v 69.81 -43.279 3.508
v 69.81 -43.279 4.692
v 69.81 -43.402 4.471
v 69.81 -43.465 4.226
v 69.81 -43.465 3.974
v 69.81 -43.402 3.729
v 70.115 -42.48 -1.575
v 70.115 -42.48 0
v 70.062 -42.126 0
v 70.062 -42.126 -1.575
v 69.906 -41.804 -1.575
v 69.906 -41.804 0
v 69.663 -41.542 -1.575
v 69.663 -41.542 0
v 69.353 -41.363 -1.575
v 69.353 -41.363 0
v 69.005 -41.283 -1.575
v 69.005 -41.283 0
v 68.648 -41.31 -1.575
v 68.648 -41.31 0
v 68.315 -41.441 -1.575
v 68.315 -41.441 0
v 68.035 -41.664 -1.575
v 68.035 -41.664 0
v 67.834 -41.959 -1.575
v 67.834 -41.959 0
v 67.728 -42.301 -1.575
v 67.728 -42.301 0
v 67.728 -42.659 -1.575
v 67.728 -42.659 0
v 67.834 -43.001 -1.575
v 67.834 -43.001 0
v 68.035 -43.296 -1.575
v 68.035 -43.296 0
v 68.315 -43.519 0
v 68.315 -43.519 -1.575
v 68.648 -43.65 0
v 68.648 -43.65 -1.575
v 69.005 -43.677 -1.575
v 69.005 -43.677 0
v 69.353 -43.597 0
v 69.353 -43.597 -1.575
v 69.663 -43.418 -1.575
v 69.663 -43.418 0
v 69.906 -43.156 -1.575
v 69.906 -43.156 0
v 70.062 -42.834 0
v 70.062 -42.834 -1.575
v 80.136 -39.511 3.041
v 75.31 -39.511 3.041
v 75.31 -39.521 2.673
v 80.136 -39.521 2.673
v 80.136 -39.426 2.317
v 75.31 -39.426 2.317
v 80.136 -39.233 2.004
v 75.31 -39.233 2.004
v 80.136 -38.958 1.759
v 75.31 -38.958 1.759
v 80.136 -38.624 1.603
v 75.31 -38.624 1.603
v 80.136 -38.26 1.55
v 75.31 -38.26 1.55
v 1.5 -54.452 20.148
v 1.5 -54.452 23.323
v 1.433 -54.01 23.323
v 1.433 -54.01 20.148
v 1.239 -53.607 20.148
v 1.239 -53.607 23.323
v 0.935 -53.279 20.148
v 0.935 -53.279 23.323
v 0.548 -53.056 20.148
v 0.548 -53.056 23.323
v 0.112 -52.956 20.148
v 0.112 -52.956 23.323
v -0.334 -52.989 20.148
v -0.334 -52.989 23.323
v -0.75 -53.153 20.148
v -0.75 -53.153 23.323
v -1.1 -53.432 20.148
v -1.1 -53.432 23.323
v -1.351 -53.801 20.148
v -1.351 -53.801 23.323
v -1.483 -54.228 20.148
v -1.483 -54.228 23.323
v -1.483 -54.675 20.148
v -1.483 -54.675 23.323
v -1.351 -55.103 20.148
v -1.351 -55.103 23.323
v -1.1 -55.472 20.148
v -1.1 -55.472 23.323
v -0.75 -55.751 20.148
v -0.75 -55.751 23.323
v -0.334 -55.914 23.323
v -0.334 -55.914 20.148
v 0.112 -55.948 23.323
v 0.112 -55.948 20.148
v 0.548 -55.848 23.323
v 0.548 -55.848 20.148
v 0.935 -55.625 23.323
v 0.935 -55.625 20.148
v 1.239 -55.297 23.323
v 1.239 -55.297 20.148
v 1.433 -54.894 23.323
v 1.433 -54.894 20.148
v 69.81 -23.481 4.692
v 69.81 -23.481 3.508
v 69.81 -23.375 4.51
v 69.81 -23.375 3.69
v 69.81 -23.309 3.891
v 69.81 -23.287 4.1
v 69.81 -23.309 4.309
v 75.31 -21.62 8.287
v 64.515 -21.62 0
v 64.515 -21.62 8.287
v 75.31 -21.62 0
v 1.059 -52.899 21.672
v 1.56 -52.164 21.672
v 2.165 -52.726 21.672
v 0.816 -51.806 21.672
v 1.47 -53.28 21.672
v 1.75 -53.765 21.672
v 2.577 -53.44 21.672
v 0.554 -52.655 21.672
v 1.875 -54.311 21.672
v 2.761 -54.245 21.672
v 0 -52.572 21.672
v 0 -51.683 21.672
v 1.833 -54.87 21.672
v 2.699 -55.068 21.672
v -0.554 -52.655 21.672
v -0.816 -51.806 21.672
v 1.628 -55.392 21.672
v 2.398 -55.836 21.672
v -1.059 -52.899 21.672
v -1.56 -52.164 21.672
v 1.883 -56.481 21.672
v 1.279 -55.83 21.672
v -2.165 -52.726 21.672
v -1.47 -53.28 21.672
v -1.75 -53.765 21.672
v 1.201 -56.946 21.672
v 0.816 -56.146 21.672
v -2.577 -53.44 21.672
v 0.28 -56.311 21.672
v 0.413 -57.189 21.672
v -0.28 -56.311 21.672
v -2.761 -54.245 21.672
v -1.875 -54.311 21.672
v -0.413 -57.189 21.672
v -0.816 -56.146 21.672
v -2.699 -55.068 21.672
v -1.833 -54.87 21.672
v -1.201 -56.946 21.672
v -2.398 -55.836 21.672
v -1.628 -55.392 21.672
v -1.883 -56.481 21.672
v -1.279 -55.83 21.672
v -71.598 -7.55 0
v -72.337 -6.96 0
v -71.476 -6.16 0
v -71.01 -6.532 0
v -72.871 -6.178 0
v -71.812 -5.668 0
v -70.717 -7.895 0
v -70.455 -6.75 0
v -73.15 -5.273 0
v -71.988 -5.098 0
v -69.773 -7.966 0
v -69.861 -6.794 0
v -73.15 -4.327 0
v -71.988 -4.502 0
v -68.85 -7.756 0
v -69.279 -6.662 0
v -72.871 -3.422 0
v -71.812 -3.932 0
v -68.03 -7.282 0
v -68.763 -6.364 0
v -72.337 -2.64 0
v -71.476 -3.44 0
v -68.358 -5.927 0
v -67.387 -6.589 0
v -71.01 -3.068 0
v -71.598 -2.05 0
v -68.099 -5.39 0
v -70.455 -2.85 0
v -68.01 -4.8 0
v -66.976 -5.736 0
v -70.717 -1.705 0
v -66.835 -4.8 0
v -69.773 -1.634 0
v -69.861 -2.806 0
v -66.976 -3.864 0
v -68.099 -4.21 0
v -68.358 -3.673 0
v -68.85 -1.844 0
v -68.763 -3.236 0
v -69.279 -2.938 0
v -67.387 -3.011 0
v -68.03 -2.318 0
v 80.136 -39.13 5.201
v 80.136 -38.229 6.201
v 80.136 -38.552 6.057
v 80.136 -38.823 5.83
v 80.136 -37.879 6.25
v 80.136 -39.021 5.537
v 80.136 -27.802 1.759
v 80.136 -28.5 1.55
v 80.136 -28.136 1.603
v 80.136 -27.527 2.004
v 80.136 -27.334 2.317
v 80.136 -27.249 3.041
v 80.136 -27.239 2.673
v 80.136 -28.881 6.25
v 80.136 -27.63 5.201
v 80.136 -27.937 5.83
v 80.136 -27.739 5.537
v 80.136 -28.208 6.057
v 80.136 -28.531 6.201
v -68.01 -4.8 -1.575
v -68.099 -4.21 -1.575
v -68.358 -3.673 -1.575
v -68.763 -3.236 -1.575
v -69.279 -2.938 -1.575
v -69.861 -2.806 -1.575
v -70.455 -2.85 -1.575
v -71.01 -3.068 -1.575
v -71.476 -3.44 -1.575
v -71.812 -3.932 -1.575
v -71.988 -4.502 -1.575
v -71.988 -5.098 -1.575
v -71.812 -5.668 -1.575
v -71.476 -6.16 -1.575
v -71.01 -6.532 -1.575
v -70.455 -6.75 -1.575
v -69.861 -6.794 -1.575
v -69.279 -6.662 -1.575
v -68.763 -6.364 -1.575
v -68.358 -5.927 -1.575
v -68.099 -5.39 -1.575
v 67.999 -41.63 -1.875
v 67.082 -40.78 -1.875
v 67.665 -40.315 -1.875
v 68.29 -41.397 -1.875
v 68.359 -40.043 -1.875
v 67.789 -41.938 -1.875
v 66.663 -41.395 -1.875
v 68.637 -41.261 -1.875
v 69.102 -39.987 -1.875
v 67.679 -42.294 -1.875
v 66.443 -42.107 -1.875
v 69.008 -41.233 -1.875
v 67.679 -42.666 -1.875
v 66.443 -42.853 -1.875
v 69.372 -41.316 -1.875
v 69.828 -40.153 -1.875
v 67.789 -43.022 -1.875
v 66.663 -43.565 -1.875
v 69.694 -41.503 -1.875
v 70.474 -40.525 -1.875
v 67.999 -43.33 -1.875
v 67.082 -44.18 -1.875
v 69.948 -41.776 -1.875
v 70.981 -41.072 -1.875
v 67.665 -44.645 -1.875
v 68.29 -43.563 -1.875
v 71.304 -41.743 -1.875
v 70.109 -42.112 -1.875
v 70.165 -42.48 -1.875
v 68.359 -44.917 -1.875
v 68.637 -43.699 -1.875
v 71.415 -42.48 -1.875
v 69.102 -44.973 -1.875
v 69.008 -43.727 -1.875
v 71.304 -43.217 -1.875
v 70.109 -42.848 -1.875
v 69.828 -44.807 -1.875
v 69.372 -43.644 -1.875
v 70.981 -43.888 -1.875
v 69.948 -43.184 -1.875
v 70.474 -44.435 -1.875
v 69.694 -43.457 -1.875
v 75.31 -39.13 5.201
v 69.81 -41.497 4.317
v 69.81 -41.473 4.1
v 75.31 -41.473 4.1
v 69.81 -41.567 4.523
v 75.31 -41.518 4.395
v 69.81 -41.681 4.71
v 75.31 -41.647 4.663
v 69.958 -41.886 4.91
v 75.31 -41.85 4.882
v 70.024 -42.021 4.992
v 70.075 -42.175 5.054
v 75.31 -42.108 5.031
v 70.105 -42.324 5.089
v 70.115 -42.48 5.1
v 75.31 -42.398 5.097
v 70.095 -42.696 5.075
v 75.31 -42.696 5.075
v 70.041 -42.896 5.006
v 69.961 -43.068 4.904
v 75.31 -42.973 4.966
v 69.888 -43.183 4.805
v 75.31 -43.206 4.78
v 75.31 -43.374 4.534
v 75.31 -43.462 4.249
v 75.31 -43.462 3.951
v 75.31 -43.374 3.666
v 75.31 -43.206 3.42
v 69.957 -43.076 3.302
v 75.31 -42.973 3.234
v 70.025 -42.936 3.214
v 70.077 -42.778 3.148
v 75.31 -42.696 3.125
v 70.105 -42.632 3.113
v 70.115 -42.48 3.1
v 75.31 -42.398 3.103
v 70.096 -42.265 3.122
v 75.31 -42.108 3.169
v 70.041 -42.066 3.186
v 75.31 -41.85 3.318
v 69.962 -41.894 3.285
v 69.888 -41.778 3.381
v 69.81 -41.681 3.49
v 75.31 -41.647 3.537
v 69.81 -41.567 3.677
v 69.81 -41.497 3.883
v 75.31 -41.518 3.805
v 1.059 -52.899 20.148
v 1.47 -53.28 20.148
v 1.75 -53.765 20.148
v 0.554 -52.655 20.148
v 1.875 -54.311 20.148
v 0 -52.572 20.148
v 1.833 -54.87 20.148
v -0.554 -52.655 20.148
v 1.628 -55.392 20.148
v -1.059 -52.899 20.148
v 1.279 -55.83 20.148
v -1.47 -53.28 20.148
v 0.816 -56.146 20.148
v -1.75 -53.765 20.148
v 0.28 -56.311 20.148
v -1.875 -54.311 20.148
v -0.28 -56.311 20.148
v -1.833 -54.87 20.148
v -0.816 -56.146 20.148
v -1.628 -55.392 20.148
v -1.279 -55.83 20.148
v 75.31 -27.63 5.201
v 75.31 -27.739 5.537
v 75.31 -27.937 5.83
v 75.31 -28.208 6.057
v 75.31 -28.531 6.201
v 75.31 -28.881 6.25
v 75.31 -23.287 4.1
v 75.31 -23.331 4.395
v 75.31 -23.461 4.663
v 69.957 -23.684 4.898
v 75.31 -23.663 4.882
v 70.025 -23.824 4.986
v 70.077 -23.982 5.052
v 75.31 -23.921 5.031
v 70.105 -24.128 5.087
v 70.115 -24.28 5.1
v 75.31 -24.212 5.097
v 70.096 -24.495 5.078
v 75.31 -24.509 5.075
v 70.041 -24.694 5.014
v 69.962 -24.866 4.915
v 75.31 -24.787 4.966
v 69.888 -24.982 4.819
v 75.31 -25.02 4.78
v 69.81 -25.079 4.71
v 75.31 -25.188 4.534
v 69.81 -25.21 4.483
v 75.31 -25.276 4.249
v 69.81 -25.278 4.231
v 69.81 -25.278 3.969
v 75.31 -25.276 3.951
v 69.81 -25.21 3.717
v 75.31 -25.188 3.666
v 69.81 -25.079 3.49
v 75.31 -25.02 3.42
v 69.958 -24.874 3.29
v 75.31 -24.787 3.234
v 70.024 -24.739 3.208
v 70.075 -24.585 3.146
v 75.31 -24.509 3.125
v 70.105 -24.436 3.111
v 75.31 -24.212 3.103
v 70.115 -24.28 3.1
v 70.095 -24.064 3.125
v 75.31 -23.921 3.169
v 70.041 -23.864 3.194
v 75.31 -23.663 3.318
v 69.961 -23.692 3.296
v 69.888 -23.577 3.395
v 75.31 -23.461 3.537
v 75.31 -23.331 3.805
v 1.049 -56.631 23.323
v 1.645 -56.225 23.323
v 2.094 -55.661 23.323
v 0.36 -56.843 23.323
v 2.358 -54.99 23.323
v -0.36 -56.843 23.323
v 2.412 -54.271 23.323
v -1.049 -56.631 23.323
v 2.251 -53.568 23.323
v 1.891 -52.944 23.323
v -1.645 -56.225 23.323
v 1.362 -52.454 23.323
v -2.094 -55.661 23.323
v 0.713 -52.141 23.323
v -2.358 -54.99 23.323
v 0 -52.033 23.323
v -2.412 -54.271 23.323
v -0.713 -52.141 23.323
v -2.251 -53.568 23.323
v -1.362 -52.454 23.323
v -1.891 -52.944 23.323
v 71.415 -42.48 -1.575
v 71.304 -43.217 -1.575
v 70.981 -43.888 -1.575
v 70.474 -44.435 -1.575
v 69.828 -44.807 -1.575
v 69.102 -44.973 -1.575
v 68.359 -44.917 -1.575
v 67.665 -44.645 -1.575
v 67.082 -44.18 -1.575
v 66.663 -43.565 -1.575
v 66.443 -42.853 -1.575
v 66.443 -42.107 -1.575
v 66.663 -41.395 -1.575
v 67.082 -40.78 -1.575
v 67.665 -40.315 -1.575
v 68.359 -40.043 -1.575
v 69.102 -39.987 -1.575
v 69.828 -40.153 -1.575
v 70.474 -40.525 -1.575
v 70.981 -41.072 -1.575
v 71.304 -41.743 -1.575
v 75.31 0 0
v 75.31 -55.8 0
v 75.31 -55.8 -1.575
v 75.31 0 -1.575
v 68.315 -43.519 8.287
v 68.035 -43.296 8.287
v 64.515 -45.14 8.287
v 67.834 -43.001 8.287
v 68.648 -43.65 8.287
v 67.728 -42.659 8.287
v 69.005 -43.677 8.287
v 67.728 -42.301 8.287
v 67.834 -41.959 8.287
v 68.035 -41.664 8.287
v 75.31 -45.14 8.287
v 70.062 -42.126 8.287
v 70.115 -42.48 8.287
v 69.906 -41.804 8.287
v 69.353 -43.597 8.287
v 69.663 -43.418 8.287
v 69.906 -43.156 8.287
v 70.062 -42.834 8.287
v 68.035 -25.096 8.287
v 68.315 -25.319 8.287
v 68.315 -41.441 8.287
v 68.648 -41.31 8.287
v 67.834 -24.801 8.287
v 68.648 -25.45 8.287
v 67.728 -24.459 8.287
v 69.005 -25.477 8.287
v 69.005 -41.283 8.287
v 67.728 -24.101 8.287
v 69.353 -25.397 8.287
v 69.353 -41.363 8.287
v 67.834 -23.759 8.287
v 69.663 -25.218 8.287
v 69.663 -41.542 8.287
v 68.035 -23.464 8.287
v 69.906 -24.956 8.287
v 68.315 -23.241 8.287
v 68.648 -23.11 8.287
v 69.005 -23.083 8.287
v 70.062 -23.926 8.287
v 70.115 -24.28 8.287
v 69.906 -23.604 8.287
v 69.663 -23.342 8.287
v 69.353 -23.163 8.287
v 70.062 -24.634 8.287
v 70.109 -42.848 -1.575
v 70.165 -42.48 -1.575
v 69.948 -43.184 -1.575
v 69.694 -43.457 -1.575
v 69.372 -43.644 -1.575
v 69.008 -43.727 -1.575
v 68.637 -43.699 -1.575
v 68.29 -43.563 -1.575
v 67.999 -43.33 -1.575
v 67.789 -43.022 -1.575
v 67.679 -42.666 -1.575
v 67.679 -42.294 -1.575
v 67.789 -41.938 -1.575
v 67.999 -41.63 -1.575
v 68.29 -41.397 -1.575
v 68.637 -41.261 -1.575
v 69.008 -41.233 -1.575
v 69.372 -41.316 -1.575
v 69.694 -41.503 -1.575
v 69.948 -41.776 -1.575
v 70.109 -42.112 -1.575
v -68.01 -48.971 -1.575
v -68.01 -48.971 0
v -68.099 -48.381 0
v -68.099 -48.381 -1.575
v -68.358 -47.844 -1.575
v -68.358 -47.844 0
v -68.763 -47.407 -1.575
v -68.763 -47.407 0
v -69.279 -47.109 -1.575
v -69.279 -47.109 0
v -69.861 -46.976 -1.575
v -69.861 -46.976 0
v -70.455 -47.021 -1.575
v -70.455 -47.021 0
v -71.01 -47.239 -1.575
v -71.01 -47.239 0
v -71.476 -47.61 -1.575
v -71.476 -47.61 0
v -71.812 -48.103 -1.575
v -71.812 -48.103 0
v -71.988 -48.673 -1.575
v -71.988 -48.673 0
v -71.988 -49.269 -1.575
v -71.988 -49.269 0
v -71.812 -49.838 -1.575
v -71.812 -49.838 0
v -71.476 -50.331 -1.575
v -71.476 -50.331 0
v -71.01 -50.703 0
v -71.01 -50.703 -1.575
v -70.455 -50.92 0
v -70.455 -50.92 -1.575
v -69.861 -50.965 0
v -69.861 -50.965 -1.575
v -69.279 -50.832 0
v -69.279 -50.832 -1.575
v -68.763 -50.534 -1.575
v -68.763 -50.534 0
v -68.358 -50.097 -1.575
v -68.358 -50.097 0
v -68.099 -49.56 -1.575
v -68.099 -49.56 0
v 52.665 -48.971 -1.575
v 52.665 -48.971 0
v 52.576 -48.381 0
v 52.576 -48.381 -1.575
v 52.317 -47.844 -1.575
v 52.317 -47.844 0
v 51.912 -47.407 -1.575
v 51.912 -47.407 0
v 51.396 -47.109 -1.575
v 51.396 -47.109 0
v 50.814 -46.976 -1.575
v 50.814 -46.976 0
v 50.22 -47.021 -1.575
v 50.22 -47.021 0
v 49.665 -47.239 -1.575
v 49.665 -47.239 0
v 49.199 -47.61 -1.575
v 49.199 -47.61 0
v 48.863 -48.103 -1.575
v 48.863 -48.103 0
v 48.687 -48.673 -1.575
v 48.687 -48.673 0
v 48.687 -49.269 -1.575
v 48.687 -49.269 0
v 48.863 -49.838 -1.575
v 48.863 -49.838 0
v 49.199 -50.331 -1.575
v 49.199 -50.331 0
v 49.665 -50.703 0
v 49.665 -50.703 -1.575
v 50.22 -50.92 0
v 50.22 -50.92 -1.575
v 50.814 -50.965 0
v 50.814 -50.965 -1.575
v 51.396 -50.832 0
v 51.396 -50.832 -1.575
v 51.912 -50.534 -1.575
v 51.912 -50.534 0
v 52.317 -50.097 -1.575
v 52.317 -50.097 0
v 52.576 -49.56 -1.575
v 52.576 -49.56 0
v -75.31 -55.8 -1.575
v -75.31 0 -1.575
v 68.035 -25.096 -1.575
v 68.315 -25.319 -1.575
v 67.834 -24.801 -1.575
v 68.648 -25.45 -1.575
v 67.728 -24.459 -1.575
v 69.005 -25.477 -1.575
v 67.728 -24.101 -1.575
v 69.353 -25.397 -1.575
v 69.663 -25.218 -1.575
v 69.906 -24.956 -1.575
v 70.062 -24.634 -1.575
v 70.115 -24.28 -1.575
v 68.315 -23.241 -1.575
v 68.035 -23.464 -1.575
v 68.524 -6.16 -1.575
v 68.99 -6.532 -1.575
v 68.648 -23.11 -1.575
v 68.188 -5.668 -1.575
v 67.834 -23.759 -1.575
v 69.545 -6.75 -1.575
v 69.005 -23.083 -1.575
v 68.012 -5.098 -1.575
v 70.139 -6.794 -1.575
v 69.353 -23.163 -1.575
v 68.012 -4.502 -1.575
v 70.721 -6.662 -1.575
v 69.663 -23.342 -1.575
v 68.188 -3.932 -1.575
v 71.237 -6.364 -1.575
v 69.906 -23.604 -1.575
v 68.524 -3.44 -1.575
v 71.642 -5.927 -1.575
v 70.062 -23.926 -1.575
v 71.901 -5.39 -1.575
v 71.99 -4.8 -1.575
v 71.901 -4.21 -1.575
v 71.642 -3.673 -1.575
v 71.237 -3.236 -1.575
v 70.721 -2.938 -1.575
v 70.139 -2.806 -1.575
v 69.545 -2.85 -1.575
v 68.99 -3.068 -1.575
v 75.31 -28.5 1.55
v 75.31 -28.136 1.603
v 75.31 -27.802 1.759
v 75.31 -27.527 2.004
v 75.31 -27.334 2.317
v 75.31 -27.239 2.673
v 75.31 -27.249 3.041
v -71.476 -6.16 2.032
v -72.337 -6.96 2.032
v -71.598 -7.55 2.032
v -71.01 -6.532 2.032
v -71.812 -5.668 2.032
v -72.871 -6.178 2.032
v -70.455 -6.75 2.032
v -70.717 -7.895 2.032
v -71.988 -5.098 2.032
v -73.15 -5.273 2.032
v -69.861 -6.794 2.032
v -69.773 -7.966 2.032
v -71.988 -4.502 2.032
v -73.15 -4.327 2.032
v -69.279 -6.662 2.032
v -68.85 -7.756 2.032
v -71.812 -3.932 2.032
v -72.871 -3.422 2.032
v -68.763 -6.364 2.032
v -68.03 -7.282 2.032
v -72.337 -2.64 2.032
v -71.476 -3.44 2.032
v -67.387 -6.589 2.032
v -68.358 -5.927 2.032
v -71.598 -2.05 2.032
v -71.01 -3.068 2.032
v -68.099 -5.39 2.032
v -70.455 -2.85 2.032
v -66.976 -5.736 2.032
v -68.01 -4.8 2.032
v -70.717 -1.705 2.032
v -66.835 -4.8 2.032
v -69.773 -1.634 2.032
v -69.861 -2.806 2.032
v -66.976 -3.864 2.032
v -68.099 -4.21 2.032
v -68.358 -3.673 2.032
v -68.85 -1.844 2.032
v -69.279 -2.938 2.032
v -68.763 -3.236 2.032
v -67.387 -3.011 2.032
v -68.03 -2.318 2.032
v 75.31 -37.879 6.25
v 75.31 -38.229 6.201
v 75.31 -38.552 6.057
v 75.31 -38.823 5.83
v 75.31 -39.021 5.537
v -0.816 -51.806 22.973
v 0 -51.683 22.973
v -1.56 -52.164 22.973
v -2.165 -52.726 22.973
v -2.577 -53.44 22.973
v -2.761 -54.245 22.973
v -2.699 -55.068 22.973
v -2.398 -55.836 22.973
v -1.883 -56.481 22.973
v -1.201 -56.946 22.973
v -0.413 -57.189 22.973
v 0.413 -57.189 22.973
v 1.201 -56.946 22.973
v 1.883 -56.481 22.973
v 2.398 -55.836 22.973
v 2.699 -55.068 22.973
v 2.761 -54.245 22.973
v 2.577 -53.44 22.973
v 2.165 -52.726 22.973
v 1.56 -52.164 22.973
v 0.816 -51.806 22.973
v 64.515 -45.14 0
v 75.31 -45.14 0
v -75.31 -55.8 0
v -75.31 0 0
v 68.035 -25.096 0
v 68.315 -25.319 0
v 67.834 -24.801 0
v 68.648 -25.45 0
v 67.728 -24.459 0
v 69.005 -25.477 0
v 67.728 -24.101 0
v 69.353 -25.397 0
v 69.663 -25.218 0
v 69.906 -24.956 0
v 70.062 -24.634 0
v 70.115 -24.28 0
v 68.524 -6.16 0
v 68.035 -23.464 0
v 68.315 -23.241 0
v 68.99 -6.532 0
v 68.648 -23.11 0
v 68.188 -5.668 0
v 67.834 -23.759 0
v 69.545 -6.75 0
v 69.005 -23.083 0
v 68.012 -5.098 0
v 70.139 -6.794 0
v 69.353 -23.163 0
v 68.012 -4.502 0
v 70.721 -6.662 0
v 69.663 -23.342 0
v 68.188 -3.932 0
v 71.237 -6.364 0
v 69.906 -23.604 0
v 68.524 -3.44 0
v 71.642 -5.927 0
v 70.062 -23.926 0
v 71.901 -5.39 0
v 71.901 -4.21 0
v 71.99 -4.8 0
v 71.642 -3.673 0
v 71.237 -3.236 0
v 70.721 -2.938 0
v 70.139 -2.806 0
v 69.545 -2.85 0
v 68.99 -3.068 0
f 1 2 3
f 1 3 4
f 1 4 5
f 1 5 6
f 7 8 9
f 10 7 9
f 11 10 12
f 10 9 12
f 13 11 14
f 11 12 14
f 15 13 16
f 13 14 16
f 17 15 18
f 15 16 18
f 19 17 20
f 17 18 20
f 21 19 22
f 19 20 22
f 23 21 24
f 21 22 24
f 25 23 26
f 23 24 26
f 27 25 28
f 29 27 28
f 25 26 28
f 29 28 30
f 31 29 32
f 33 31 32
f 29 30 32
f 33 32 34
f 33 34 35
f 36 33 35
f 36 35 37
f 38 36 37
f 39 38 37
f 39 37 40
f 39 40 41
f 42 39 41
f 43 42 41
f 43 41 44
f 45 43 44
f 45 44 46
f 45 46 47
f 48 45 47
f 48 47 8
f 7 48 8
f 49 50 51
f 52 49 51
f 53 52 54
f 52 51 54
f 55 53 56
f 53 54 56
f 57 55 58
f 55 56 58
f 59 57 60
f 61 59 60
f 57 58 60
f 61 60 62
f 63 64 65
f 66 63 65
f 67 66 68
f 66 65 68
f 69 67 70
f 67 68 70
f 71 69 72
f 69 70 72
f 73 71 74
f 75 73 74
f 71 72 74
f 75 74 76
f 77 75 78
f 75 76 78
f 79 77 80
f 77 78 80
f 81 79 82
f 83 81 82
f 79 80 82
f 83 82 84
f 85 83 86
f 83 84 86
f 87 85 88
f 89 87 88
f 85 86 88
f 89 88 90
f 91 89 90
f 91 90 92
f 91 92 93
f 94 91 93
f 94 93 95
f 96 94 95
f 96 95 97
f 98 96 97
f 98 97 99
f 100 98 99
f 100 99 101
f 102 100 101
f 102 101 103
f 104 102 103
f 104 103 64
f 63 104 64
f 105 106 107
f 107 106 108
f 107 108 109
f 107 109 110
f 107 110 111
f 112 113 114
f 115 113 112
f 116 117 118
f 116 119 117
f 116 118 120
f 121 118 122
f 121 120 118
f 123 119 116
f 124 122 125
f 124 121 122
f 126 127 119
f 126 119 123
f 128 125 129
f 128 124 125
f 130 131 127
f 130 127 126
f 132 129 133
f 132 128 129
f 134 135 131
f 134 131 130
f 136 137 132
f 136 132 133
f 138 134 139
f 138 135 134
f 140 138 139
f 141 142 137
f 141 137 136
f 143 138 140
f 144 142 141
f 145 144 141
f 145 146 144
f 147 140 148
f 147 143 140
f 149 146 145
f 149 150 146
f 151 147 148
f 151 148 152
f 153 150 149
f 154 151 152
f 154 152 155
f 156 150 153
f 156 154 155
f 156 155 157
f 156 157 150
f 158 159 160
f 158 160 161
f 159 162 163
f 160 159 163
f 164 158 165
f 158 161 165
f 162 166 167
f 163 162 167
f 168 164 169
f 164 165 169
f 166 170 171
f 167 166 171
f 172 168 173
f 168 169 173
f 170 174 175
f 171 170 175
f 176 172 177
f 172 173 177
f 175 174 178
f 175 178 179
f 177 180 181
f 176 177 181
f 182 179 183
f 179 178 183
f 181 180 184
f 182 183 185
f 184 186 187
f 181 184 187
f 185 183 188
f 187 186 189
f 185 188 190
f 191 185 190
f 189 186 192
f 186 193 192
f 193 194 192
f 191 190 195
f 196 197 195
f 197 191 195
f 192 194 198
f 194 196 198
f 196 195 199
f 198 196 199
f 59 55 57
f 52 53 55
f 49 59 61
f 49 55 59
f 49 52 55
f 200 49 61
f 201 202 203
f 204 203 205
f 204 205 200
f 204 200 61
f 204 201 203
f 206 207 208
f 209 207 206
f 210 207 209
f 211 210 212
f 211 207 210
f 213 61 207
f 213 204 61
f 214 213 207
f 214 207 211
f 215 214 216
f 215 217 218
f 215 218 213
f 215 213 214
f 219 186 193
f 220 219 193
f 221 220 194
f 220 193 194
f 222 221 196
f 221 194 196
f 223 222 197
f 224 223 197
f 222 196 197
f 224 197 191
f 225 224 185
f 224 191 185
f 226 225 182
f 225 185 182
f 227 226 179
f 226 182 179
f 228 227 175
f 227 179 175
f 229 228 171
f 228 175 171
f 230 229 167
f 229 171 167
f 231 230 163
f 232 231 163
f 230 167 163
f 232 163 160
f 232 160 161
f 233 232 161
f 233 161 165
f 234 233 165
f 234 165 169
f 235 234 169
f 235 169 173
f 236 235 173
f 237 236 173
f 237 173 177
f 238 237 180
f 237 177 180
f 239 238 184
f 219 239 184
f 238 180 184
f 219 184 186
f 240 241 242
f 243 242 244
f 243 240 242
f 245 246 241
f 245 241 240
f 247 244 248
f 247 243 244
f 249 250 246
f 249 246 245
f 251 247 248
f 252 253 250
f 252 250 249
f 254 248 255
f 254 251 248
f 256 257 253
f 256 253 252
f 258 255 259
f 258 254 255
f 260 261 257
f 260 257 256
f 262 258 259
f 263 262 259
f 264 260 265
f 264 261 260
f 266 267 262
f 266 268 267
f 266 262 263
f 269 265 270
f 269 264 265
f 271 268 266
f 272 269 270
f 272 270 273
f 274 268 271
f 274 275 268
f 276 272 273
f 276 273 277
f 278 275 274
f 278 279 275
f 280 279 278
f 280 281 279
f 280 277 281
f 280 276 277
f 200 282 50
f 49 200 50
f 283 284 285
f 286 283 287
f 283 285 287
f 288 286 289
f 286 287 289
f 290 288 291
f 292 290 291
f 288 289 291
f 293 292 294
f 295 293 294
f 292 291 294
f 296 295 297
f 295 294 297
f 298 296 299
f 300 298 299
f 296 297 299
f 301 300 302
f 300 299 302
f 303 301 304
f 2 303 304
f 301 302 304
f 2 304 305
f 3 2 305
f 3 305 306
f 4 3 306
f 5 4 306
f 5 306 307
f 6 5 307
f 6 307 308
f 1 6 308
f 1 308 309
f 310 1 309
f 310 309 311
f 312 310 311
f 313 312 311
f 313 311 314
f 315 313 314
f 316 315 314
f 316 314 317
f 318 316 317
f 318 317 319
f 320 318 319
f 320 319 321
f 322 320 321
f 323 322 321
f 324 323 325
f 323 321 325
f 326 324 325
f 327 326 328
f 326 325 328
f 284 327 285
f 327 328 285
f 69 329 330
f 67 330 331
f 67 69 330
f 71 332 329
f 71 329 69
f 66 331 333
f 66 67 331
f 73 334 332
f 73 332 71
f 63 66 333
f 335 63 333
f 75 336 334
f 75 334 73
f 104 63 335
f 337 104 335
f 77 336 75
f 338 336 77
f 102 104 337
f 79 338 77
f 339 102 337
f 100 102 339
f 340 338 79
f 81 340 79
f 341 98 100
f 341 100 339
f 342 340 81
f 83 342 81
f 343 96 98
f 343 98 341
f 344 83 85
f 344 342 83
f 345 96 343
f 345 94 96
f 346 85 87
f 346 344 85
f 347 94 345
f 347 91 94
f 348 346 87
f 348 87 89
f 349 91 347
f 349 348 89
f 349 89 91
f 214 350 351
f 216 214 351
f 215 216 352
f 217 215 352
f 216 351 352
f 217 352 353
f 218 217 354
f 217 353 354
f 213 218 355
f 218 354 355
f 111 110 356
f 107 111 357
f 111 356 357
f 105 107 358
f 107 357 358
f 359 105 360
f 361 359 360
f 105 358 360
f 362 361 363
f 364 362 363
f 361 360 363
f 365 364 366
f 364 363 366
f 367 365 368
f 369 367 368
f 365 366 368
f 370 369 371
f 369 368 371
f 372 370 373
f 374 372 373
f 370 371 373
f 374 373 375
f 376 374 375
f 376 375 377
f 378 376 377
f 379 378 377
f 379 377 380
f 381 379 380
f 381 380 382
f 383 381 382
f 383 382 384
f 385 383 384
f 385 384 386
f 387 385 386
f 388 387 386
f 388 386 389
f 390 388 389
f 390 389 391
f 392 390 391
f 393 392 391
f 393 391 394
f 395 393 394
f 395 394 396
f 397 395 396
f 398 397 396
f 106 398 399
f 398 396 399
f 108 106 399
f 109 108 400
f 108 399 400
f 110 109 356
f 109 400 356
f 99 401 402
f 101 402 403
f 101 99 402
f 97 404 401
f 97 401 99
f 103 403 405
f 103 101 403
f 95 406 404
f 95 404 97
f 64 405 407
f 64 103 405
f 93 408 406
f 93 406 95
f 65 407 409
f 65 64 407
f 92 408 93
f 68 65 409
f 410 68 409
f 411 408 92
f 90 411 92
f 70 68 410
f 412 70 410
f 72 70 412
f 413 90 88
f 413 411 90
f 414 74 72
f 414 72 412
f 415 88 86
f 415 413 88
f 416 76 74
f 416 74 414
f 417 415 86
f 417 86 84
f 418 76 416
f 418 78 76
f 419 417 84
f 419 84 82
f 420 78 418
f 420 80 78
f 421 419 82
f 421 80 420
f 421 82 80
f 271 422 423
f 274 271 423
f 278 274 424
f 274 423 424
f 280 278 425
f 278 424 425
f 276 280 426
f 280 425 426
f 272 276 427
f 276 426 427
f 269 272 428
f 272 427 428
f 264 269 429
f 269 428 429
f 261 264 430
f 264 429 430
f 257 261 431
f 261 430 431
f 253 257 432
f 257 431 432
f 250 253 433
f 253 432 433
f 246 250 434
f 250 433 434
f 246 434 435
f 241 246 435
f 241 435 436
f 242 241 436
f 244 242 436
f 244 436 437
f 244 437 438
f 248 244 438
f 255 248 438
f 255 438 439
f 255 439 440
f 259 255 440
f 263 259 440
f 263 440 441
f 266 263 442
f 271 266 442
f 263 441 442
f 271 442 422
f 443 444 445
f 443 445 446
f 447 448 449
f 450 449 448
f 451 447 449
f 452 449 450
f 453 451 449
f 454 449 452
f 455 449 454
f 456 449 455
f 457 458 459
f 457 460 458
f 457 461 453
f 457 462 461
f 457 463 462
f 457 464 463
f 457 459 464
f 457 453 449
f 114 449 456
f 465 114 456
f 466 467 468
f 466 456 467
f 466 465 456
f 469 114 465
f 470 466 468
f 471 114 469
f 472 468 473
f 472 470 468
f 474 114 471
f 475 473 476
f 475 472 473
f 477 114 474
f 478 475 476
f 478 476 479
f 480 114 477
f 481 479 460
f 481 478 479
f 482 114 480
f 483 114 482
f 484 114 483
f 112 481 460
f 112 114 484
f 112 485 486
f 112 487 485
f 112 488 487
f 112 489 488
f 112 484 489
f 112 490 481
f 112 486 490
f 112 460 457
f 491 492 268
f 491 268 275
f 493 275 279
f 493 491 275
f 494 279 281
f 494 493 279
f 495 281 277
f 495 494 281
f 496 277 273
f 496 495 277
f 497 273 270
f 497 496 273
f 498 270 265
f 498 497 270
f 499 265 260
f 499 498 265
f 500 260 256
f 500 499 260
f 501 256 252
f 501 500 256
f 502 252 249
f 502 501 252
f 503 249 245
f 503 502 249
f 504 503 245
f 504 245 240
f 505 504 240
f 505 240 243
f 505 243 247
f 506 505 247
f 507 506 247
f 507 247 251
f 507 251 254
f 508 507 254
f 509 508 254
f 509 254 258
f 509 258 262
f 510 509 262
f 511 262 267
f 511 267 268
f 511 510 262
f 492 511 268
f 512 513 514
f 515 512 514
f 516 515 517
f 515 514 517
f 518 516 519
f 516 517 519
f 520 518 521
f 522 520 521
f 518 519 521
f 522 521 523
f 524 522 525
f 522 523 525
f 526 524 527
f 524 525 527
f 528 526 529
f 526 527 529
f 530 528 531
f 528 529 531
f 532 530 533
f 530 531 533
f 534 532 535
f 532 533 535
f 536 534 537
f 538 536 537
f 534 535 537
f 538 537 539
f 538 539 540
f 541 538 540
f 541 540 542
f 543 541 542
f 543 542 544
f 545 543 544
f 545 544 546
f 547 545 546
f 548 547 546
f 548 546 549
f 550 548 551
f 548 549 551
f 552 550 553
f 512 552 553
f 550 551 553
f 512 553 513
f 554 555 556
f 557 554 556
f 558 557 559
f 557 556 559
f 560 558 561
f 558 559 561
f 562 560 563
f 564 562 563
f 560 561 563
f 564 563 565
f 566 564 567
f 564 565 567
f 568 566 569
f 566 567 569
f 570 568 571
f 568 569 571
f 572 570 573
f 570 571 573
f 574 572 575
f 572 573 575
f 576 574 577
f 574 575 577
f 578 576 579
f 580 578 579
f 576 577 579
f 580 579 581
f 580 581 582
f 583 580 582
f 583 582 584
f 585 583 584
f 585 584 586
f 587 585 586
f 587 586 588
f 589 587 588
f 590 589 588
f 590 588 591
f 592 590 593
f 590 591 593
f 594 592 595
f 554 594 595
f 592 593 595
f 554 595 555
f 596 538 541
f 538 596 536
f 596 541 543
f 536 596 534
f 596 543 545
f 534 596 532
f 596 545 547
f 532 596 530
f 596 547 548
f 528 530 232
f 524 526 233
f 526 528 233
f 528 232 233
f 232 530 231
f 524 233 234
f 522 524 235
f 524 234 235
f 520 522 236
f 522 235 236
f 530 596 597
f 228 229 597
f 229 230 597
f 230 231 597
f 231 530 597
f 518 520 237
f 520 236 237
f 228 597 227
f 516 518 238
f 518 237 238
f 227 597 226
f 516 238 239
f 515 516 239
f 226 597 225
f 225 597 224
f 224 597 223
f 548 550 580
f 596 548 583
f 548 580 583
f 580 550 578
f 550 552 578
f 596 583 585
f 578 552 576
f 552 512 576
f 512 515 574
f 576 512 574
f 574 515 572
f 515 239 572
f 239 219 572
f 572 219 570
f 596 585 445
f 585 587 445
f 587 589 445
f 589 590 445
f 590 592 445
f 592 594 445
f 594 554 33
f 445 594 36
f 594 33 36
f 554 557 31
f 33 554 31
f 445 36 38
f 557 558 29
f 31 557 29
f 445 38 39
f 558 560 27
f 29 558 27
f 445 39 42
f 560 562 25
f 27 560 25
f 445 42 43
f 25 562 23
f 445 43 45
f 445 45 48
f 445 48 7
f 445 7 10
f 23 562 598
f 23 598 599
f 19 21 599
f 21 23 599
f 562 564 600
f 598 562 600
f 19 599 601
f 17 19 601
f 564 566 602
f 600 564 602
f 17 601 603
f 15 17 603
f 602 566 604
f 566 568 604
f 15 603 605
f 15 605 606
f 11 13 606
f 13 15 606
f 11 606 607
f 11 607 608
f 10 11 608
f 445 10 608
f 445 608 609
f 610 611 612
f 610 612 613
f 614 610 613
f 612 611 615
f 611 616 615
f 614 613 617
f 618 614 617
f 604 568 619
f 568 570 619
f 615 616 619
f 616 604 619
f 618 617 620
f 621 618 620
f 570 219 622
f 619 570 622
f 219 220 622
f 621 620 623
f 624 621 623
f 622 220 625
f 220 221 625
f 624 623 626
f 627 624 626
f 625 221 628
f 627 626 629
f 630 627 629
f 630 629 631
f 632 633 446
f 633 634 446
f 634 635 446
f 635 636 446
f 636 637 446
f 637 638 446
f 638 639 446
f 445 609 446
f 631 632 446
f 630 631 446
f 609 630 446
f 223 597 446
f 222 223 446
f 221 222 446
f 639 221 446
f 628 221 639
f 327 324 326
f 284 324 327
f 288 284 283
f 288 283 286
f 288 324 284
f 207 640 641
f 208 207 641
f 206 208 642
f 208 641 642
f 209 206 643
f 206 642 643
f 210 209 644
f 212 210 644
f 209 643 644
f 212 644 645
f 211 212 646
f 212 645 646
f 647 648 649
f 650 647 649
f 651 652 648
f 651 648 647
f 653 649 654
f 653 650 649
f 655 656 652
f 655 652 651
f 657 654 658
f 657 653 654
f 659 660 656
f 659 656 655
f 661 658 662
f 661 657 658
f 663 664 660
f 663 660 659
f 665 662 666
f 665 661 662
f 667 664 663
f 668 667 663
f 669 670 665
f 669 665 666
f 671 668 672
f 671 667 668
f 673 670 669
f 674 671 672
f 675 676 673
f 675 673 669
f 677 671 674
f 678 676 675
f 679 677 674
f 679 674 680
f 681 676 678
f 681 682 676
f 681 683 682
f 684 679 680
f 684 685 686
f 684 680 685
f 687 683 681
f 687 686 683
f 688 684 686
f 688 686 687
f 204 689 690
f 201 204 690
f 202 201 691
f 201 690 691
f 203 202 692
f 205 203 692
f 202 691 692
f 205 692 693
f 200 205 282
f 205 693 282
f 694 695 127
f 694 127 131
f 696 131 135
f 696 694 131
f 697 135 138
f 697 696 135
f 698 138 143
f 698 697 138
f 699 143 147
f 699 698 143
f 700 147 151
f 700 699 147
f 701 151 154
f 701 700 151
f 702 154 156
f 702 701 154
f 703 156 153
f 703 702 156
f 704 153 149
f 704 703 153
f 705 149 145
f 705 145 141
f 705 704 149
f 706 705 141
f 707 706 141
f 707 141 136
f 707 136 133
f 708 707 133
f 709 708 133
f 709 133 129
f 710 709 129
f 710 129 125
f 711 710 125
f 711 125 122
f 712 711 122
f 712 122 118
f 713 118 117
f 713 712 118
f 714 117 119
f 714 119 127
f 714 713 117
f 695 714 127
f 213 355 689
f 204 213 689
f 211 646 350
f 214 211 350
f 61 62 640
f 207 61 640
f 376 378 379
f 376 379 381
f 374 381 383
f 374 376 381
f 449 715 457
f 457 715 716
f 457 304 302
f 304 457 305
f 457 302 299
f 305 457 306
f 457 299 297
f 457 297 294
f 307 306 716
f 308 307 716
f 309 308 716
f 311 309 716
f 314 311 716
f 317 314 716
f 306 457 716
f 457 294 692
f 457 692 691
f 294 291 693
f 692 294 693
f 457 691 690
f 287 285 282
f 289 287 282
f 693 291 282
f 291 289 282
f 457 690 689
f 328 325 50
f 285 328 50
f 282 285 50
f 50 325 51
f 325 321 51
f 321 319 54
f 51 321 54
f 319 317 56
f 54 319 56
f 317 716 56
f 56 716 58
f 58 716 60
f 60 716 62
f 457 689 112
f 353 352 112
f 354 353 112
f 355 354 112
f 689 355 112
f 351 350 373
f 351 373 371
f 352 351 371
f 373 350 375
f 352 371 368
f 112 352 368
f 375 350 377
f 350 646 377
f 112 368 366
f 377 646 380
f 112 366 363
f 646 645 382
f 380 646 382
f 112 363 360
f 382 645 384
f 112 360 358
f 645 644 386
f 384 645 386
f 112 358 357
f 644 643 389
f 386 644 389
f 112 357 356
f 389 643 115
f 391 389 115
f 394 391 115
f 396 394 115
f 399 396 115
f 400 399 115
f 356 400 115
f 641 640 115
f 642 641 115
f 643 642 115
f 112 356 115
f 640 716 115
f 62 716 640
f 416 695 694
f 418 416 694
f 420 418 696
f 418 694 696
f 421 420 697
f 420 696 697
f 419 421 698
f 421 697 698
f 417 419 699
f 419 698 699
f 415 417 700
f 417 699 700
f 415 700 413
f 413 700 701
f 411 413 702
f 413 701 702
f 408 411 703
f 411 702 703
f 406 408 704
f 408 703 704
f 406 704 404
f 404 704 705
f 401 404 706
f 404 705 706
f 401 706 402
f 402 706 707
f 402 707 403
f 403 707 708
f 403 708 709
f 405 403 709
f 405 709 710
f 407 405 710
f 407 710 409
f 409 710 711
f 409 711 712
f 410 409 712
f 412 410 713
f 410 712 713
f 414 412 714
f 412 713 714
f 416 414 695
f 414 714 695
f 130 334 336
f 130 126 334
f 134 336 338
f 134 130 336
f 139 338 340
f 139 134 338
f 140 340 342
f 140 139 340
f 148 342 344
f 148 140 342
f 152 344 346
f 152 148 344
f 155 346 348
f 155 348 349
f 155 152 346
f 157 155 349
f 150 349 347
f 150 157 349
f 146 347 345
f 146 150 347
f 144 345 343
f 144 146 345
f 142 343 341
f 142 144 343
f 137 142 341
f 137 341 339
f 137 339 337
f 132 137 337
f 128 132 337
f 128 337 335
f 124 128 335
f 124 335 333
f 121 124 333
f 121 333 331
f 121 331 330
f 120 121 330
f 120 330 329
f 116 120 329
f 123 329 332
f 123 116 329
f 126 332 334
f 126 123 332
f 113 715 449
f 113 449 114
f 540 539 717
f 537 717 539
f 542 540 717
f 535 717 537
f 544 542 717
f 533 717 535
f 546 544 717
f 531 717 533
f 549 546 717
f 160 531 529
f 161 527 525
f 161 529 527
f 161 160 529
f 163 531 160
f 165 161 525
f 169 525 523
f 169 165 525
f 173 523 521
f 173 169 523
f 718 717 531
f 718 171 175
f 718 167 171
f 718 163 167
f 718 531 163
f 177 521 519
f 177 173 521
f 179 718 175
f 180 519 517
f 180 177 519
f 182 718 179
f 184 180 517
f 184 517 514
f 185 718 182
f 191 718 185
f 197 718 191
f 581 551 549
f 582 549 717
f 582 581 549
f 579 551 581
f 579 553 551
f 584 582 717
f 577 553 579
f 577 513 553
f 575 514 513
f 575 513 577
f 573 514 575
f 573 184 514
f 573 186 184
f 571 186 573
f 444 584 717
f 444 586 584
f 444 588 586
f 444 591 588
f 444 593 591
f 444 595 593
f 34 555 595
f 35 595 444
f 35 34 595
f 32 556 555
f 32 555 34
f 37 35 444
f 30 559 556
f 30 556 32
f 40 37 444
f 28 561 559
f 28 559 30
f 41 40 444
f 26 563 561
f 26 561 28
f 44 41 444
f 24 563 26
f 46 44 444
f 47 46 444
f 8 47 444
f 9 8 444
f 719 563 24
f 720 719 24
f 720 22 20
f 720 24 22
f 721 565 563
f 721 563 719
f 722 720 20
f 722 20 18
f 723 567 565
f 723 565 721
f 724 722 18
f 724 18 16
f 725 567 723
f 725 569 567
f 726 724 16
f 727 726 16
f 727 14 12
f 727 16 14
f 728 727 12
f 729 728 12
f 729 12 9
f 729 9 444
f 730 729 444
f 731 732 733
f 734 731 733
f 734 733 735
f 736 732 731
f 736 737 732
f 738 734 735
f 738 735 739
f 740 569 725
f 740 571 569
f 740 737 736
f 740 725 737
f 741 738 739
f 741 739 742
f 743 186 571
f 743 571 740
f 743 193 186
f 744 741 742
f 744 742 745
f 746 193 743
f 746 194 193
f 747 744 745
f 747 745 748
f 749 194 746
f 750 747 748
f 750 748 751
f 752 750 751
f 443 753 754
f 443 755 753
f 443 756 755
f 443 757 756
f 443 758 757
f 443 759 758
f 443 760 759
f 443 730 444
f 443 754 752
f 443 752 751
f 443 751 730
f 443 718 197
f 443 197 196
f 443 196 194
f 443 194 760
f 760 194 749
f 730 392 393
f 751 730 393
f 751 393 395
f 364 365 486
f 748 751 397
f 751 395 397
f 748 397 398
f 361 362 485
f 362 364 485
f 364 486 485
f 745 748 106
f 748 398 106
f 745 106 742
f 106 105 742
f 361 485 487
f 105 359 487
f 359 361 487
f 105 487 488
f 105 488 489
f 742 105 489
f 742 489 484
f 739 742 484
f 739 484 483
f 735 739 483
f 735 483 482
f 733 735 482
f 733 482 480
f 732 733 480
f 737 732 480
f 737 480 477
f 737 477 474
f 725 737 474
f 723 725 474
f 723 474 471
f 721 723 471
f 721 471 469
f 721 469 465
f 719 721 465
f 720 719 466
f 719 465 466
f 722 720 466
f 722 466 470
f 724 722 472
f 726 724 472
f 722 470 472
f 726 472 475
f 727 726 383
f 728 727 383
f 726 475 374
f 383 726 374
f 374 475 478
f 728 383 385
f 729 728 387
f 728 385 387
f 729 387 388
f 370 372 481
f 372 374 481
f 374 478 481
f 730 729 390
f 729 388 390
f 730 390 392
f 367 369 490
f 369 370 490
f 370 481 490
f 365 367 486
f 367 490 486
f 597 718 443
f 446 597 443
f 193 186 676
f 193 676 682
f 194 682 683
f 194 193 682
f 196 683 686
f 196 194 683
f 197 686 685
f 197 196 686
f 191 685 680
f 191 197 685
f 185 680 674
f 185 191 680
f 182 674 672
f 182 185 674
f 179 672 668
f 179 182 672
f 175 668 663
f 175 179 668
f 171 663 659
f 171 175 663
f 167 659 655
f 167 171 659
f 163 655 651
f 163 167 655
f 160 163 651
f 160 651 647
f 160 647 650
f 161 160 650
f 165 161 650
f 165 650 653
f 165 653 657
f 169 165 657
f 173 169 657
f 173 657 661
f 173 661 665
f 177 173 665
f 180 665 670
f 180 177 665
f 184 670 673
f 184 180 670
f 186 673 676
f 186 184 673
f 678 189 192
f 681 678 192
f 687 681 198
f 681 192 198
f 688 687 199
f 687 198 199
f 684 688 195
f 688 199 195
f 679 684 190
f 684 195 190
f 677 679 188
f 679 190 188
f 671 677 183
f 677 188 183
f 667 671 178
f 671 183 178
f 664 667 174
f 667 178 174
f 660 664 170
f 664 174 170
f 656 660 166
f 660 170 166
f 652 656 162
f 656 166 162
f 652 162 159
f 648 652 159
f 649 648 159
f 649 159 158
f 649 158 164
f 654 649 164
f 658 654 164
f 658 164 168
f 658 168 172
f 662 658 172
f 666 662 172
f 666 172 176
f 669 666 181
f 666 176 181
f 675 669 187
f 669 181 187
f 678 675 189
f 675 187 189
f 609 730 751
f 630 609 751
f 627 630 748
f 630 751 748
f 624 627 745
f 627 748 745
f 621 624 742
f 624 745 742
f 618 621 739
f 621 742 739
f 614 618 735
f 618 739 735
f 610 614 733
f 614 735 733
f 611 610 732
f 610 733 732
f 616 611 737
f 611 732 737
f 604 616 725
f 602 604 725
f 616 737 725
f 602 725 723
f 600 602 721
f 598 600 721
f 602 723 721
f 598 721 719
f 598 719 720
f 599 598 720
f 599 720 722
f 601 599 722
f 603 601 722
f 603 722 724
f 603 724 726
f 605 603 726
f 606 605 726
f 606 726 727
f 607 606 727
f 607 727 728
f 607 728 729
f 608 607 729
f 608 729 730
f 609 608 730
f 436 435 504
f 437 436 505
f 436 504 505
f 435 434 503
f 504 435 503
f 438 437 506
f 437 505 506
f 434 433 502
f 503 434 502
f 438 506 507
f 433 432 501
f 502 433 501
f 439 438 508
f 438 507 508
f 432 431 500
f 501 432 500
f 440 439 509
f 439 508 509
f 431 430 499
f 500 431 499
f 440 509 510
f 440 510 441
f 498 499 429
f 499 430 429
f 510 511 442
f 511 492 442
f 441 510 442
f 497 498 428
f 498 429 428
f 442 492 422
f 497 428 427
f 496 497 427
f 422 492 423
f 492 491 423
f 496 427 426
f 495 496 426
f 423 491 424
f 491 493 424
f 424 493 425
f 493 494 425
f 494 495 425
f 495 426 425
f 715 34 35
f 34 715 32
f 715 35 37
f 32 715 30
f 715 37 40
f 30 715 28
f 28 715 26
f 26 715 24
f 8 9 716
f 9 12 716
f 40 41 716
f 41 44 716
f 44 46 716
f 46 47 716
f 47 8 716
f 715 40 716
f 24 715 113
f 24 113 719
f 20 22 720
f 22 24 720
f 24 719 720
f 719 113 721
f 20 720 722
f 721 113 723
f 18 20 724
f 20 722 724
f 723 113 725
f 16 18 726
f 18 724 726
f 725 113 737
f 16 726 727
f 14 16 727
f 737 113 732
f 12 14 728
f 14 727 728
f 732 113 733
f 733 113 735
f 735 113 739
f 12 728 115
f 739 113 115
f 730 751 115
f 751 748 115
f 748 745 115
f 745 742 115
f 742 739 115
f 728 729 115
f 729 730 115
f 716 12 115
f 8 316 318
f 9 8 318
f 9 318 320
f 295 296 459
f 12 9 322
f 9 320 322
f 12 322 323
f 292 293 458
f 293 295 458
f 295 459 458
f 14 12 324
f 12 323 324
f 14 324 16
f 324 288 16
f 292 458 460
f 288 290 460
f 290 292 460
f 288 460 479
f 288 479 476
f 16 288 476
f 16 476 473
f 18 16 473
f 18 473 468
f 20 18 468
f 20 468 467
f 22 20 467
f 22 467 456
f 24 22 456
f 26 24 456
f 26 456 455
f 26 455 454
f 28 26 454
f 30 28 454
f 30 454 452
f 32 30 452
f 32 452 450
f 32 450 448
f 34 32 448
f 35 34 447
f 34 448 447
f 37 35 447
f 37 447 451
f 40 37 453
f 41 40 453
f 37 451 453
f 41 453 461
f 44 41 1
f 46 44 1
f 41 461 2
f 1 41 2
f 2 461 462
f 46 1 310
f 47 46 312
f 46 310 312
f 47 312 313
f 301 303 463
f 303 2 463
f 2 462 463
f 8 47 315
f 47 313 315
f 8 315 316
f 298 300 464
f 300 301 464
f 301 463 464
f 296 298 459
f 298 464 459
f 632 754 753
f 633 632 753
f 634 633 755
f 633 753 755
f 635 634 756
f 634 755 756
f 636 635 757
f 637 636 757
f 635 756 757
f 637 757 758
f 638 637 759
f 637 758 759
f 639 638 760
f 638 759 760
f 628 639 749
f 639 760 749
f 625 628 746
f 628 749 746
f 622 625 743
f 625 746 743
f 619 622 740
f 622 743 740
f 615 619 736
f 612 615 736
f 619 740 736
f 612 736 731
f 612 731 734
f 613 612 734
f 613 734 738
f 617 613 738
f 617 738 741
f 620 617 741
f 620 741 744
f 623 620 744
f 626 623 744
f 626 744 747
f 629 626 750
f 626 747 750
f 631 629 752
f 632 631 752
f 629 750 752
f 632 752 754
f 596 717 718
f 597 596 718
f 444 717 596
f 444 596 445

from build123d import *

# Parameters (mm, degrees)
F0_W      = 150.62
F0_H      = 55.8
F0_R      = 2
F1_DEPTH  = 1.5748
F2_R      = 3.175
F2_R_2    = 2
F3_DEPTH  = 2.032
F4_W      = 10.795
F4_H      = 23.52
F5_DEPTH  = 8.2874
F7_DEPTH  = 4.826
F8_R      = 1.2
F9_DEPTH  = 9.8632
F10_R     = 1.2
F11_DEPTH = 9.8632
F12_R     = 1
F13_DEPTH = 5.5
F16_SIZE  = 0.35
F17_R     = 1.5
F18_DEPTH = 25
F19_R     = 2.5
F19_R_2   = 1.25
F20_DEPTH = 0.3


with BuildPart() as f1:
    # F0 (on Top) → F1 (new body)
    with BuildSketch(Plane.XY):
        with Locations((0, -27.9)):
            Rectangle(F0_W, F0_H)
        with Locations((-70.01, -48.9706)):
            Circle(F0_R, mode=Mode.SUBTRACT)
        with Locations((50.665, -48.9706)):
            Circle(F0_R, mode=Mode.SUBTRACT)
        with Locations((-70.01, -4.8)):
            Circle(F0_R, mode=Mode.SUBTRACT)
        with Locations((69.99, -4.8)):
            Circle(F0_R, mode=Mode.SUBTRACT)
    extrude(amount=-F1_DEPTH)


with BuildPart() as f3:
    # F2 (on Top) → F3 (new body)
    with BuildSketch(Plane.XY):
        with Locations((-70.01, -4.8)):
            Circle(F2_R)
        with Locations((-70.01, -4.8)):
            Circle(F2_R_2, mode=Mode.SUBTRACT)
    extrude(amount=F3_DEPTH)


with BuildPart() as f5:
    # F4 (on face) → F5 (new body)
    with BuildSketch(Plane.XY):
        with Locations((69.9125, -33.38)):
            Rectangle(F4_W, F4_H)
    extrude(amount=F5_DEPTH)

    # F6 (on face) → F7 (join)
    with BuildSketch(Plane.YZ.offset(75.31)):
        with BuildLine():
            Line((-28.8808662783, 6.25), (-37.8791337217, 6.25))
            ThreePointArc((-37.8791337217, 6.25), (-38.695473986, 5.9528764428), (-39.129839568, 5.2005331856))
            Line((-39.129839568, 5.2005331856), (-39.5107058463, 3.0405331856))
            ThreePointArc((-39.5107058463, 3.0405331856), (-39.2328764428, 2.0036597357), (-38.26, 1.55))
            Line((-38.26, 1.55), (-28.5, 1.55))
            ThreePointArc((-28.5, 1.55), (-27.5271235572, 2.0036597357), (-27.2492941537, 3.0405331856))
            Line((-27.2492941537, 3.0405331856), (-27.630160432, 5.2005331856))
            ThreePointArc((-27.630160432, 5.2005331856), (-28.064526014, 5.9528764428), (-28.8808662783, 6.25))
        make_face()
    extrude(amount=F7_DEPTH)


with BuildPart() as f9_tool:
    # F8 (on face) → F9 (new body, through all)
    with BuildSketch(Plane.XY.offset(8.2874)):
        with Locations((68.915, -24.28)):
            Circle(F8_R)
        with Locations((68.915, -42.48)):
            Circle(F8_R)
    extrude(amount=-F9_DEPTH)


with BuildPart() as f1_1:
    add(f1.part)

    # F9: cut by f9_tool
    add(f9_tool.part, mode=Mode.SUBTRACT)

    # F10 (on face) → F11 (cut, through all)
    with BuildSketch(Plane(origin=(0, 0, -1.5748), x_dir=(1, 0, 0), z_dir=(0, 0, -1))):
        with Locations((68.915, 42.48)):
            Circle(F10_R)
        with Locations((68.915, 24.28)):
            Circle(F10_R)
    extrude(amount=-F11_DEPTH, mode=Mode.SUBTRACT)


with BuildPart() as f5_1:
    add(f5.part)

    # F9: cut by f9_tool
    add(f9_tool.part, mode=Mode.SUBTRACT)

    # F12 (on face) → F13 (cut)
    with BuildSketch(Plane.YZ.offset(75.31)):
        with Locations((-42.4732, 4.1)):
            Circle(F12_R)
        with Locations((-24.2868, 4.1)):
            Circle(F12_R)
    extrude(amount=-F13_DEPTH, mode=Mode.SUBTRACT)


with BuildPart() as f15:
    # F14 (on Right) → F15 (revolve)
    with BuildSketch(Plane.YZ):
        Polygon((-51.6833615305, 23.323435563), (-54.4518615305, 23.323435563), (-54.4518615305, 20.148435563), (-52.5718615305, 20.148435563), (-52.5718615305, 21.672435563), (-51.6833615305, 21.672435563), align=None)
    revolve(axis=Axis((0, -54.4518615305, 32.5609651819), (0, 0, 1)))

    # F16
    f16_edges = [f15.edges().sort_by_distance(p)[0] for p in [
        (0, -57.220362, 23.323436),
    ]]
    chamfer(f16_edges, length=F16_SIZE)

    # F17 (on face) → F18 (cut)
    with BuildSketch(Plane.XY.offset(23.323435563)):
        with Locations((0, -54.4518615305)):
            Circle(F17_R)
    extrude(amount=-F18_DEPTH, mode=Mode.SUBTRACT)


with BuildPart() as f20:
    # F19 (on face) → F20 (new body)
    with BuildSketch(Plane(origin=(0, 0, -1.5748), x_dir=(1, 0, 0), z_dir=(0, 0, -1))):
        with Locations((68.915, 42.48)):
            Circle(F19_R)
        with Locations((68.915, 42.48)):
            Circle(F19_R_2, mode=Mode.SUBTRACT)
    extrude(amount=F20_DEPTH)


solid = Compound([f3.part, f1_1.part, f5_1.part, f15.part, f20.part])
